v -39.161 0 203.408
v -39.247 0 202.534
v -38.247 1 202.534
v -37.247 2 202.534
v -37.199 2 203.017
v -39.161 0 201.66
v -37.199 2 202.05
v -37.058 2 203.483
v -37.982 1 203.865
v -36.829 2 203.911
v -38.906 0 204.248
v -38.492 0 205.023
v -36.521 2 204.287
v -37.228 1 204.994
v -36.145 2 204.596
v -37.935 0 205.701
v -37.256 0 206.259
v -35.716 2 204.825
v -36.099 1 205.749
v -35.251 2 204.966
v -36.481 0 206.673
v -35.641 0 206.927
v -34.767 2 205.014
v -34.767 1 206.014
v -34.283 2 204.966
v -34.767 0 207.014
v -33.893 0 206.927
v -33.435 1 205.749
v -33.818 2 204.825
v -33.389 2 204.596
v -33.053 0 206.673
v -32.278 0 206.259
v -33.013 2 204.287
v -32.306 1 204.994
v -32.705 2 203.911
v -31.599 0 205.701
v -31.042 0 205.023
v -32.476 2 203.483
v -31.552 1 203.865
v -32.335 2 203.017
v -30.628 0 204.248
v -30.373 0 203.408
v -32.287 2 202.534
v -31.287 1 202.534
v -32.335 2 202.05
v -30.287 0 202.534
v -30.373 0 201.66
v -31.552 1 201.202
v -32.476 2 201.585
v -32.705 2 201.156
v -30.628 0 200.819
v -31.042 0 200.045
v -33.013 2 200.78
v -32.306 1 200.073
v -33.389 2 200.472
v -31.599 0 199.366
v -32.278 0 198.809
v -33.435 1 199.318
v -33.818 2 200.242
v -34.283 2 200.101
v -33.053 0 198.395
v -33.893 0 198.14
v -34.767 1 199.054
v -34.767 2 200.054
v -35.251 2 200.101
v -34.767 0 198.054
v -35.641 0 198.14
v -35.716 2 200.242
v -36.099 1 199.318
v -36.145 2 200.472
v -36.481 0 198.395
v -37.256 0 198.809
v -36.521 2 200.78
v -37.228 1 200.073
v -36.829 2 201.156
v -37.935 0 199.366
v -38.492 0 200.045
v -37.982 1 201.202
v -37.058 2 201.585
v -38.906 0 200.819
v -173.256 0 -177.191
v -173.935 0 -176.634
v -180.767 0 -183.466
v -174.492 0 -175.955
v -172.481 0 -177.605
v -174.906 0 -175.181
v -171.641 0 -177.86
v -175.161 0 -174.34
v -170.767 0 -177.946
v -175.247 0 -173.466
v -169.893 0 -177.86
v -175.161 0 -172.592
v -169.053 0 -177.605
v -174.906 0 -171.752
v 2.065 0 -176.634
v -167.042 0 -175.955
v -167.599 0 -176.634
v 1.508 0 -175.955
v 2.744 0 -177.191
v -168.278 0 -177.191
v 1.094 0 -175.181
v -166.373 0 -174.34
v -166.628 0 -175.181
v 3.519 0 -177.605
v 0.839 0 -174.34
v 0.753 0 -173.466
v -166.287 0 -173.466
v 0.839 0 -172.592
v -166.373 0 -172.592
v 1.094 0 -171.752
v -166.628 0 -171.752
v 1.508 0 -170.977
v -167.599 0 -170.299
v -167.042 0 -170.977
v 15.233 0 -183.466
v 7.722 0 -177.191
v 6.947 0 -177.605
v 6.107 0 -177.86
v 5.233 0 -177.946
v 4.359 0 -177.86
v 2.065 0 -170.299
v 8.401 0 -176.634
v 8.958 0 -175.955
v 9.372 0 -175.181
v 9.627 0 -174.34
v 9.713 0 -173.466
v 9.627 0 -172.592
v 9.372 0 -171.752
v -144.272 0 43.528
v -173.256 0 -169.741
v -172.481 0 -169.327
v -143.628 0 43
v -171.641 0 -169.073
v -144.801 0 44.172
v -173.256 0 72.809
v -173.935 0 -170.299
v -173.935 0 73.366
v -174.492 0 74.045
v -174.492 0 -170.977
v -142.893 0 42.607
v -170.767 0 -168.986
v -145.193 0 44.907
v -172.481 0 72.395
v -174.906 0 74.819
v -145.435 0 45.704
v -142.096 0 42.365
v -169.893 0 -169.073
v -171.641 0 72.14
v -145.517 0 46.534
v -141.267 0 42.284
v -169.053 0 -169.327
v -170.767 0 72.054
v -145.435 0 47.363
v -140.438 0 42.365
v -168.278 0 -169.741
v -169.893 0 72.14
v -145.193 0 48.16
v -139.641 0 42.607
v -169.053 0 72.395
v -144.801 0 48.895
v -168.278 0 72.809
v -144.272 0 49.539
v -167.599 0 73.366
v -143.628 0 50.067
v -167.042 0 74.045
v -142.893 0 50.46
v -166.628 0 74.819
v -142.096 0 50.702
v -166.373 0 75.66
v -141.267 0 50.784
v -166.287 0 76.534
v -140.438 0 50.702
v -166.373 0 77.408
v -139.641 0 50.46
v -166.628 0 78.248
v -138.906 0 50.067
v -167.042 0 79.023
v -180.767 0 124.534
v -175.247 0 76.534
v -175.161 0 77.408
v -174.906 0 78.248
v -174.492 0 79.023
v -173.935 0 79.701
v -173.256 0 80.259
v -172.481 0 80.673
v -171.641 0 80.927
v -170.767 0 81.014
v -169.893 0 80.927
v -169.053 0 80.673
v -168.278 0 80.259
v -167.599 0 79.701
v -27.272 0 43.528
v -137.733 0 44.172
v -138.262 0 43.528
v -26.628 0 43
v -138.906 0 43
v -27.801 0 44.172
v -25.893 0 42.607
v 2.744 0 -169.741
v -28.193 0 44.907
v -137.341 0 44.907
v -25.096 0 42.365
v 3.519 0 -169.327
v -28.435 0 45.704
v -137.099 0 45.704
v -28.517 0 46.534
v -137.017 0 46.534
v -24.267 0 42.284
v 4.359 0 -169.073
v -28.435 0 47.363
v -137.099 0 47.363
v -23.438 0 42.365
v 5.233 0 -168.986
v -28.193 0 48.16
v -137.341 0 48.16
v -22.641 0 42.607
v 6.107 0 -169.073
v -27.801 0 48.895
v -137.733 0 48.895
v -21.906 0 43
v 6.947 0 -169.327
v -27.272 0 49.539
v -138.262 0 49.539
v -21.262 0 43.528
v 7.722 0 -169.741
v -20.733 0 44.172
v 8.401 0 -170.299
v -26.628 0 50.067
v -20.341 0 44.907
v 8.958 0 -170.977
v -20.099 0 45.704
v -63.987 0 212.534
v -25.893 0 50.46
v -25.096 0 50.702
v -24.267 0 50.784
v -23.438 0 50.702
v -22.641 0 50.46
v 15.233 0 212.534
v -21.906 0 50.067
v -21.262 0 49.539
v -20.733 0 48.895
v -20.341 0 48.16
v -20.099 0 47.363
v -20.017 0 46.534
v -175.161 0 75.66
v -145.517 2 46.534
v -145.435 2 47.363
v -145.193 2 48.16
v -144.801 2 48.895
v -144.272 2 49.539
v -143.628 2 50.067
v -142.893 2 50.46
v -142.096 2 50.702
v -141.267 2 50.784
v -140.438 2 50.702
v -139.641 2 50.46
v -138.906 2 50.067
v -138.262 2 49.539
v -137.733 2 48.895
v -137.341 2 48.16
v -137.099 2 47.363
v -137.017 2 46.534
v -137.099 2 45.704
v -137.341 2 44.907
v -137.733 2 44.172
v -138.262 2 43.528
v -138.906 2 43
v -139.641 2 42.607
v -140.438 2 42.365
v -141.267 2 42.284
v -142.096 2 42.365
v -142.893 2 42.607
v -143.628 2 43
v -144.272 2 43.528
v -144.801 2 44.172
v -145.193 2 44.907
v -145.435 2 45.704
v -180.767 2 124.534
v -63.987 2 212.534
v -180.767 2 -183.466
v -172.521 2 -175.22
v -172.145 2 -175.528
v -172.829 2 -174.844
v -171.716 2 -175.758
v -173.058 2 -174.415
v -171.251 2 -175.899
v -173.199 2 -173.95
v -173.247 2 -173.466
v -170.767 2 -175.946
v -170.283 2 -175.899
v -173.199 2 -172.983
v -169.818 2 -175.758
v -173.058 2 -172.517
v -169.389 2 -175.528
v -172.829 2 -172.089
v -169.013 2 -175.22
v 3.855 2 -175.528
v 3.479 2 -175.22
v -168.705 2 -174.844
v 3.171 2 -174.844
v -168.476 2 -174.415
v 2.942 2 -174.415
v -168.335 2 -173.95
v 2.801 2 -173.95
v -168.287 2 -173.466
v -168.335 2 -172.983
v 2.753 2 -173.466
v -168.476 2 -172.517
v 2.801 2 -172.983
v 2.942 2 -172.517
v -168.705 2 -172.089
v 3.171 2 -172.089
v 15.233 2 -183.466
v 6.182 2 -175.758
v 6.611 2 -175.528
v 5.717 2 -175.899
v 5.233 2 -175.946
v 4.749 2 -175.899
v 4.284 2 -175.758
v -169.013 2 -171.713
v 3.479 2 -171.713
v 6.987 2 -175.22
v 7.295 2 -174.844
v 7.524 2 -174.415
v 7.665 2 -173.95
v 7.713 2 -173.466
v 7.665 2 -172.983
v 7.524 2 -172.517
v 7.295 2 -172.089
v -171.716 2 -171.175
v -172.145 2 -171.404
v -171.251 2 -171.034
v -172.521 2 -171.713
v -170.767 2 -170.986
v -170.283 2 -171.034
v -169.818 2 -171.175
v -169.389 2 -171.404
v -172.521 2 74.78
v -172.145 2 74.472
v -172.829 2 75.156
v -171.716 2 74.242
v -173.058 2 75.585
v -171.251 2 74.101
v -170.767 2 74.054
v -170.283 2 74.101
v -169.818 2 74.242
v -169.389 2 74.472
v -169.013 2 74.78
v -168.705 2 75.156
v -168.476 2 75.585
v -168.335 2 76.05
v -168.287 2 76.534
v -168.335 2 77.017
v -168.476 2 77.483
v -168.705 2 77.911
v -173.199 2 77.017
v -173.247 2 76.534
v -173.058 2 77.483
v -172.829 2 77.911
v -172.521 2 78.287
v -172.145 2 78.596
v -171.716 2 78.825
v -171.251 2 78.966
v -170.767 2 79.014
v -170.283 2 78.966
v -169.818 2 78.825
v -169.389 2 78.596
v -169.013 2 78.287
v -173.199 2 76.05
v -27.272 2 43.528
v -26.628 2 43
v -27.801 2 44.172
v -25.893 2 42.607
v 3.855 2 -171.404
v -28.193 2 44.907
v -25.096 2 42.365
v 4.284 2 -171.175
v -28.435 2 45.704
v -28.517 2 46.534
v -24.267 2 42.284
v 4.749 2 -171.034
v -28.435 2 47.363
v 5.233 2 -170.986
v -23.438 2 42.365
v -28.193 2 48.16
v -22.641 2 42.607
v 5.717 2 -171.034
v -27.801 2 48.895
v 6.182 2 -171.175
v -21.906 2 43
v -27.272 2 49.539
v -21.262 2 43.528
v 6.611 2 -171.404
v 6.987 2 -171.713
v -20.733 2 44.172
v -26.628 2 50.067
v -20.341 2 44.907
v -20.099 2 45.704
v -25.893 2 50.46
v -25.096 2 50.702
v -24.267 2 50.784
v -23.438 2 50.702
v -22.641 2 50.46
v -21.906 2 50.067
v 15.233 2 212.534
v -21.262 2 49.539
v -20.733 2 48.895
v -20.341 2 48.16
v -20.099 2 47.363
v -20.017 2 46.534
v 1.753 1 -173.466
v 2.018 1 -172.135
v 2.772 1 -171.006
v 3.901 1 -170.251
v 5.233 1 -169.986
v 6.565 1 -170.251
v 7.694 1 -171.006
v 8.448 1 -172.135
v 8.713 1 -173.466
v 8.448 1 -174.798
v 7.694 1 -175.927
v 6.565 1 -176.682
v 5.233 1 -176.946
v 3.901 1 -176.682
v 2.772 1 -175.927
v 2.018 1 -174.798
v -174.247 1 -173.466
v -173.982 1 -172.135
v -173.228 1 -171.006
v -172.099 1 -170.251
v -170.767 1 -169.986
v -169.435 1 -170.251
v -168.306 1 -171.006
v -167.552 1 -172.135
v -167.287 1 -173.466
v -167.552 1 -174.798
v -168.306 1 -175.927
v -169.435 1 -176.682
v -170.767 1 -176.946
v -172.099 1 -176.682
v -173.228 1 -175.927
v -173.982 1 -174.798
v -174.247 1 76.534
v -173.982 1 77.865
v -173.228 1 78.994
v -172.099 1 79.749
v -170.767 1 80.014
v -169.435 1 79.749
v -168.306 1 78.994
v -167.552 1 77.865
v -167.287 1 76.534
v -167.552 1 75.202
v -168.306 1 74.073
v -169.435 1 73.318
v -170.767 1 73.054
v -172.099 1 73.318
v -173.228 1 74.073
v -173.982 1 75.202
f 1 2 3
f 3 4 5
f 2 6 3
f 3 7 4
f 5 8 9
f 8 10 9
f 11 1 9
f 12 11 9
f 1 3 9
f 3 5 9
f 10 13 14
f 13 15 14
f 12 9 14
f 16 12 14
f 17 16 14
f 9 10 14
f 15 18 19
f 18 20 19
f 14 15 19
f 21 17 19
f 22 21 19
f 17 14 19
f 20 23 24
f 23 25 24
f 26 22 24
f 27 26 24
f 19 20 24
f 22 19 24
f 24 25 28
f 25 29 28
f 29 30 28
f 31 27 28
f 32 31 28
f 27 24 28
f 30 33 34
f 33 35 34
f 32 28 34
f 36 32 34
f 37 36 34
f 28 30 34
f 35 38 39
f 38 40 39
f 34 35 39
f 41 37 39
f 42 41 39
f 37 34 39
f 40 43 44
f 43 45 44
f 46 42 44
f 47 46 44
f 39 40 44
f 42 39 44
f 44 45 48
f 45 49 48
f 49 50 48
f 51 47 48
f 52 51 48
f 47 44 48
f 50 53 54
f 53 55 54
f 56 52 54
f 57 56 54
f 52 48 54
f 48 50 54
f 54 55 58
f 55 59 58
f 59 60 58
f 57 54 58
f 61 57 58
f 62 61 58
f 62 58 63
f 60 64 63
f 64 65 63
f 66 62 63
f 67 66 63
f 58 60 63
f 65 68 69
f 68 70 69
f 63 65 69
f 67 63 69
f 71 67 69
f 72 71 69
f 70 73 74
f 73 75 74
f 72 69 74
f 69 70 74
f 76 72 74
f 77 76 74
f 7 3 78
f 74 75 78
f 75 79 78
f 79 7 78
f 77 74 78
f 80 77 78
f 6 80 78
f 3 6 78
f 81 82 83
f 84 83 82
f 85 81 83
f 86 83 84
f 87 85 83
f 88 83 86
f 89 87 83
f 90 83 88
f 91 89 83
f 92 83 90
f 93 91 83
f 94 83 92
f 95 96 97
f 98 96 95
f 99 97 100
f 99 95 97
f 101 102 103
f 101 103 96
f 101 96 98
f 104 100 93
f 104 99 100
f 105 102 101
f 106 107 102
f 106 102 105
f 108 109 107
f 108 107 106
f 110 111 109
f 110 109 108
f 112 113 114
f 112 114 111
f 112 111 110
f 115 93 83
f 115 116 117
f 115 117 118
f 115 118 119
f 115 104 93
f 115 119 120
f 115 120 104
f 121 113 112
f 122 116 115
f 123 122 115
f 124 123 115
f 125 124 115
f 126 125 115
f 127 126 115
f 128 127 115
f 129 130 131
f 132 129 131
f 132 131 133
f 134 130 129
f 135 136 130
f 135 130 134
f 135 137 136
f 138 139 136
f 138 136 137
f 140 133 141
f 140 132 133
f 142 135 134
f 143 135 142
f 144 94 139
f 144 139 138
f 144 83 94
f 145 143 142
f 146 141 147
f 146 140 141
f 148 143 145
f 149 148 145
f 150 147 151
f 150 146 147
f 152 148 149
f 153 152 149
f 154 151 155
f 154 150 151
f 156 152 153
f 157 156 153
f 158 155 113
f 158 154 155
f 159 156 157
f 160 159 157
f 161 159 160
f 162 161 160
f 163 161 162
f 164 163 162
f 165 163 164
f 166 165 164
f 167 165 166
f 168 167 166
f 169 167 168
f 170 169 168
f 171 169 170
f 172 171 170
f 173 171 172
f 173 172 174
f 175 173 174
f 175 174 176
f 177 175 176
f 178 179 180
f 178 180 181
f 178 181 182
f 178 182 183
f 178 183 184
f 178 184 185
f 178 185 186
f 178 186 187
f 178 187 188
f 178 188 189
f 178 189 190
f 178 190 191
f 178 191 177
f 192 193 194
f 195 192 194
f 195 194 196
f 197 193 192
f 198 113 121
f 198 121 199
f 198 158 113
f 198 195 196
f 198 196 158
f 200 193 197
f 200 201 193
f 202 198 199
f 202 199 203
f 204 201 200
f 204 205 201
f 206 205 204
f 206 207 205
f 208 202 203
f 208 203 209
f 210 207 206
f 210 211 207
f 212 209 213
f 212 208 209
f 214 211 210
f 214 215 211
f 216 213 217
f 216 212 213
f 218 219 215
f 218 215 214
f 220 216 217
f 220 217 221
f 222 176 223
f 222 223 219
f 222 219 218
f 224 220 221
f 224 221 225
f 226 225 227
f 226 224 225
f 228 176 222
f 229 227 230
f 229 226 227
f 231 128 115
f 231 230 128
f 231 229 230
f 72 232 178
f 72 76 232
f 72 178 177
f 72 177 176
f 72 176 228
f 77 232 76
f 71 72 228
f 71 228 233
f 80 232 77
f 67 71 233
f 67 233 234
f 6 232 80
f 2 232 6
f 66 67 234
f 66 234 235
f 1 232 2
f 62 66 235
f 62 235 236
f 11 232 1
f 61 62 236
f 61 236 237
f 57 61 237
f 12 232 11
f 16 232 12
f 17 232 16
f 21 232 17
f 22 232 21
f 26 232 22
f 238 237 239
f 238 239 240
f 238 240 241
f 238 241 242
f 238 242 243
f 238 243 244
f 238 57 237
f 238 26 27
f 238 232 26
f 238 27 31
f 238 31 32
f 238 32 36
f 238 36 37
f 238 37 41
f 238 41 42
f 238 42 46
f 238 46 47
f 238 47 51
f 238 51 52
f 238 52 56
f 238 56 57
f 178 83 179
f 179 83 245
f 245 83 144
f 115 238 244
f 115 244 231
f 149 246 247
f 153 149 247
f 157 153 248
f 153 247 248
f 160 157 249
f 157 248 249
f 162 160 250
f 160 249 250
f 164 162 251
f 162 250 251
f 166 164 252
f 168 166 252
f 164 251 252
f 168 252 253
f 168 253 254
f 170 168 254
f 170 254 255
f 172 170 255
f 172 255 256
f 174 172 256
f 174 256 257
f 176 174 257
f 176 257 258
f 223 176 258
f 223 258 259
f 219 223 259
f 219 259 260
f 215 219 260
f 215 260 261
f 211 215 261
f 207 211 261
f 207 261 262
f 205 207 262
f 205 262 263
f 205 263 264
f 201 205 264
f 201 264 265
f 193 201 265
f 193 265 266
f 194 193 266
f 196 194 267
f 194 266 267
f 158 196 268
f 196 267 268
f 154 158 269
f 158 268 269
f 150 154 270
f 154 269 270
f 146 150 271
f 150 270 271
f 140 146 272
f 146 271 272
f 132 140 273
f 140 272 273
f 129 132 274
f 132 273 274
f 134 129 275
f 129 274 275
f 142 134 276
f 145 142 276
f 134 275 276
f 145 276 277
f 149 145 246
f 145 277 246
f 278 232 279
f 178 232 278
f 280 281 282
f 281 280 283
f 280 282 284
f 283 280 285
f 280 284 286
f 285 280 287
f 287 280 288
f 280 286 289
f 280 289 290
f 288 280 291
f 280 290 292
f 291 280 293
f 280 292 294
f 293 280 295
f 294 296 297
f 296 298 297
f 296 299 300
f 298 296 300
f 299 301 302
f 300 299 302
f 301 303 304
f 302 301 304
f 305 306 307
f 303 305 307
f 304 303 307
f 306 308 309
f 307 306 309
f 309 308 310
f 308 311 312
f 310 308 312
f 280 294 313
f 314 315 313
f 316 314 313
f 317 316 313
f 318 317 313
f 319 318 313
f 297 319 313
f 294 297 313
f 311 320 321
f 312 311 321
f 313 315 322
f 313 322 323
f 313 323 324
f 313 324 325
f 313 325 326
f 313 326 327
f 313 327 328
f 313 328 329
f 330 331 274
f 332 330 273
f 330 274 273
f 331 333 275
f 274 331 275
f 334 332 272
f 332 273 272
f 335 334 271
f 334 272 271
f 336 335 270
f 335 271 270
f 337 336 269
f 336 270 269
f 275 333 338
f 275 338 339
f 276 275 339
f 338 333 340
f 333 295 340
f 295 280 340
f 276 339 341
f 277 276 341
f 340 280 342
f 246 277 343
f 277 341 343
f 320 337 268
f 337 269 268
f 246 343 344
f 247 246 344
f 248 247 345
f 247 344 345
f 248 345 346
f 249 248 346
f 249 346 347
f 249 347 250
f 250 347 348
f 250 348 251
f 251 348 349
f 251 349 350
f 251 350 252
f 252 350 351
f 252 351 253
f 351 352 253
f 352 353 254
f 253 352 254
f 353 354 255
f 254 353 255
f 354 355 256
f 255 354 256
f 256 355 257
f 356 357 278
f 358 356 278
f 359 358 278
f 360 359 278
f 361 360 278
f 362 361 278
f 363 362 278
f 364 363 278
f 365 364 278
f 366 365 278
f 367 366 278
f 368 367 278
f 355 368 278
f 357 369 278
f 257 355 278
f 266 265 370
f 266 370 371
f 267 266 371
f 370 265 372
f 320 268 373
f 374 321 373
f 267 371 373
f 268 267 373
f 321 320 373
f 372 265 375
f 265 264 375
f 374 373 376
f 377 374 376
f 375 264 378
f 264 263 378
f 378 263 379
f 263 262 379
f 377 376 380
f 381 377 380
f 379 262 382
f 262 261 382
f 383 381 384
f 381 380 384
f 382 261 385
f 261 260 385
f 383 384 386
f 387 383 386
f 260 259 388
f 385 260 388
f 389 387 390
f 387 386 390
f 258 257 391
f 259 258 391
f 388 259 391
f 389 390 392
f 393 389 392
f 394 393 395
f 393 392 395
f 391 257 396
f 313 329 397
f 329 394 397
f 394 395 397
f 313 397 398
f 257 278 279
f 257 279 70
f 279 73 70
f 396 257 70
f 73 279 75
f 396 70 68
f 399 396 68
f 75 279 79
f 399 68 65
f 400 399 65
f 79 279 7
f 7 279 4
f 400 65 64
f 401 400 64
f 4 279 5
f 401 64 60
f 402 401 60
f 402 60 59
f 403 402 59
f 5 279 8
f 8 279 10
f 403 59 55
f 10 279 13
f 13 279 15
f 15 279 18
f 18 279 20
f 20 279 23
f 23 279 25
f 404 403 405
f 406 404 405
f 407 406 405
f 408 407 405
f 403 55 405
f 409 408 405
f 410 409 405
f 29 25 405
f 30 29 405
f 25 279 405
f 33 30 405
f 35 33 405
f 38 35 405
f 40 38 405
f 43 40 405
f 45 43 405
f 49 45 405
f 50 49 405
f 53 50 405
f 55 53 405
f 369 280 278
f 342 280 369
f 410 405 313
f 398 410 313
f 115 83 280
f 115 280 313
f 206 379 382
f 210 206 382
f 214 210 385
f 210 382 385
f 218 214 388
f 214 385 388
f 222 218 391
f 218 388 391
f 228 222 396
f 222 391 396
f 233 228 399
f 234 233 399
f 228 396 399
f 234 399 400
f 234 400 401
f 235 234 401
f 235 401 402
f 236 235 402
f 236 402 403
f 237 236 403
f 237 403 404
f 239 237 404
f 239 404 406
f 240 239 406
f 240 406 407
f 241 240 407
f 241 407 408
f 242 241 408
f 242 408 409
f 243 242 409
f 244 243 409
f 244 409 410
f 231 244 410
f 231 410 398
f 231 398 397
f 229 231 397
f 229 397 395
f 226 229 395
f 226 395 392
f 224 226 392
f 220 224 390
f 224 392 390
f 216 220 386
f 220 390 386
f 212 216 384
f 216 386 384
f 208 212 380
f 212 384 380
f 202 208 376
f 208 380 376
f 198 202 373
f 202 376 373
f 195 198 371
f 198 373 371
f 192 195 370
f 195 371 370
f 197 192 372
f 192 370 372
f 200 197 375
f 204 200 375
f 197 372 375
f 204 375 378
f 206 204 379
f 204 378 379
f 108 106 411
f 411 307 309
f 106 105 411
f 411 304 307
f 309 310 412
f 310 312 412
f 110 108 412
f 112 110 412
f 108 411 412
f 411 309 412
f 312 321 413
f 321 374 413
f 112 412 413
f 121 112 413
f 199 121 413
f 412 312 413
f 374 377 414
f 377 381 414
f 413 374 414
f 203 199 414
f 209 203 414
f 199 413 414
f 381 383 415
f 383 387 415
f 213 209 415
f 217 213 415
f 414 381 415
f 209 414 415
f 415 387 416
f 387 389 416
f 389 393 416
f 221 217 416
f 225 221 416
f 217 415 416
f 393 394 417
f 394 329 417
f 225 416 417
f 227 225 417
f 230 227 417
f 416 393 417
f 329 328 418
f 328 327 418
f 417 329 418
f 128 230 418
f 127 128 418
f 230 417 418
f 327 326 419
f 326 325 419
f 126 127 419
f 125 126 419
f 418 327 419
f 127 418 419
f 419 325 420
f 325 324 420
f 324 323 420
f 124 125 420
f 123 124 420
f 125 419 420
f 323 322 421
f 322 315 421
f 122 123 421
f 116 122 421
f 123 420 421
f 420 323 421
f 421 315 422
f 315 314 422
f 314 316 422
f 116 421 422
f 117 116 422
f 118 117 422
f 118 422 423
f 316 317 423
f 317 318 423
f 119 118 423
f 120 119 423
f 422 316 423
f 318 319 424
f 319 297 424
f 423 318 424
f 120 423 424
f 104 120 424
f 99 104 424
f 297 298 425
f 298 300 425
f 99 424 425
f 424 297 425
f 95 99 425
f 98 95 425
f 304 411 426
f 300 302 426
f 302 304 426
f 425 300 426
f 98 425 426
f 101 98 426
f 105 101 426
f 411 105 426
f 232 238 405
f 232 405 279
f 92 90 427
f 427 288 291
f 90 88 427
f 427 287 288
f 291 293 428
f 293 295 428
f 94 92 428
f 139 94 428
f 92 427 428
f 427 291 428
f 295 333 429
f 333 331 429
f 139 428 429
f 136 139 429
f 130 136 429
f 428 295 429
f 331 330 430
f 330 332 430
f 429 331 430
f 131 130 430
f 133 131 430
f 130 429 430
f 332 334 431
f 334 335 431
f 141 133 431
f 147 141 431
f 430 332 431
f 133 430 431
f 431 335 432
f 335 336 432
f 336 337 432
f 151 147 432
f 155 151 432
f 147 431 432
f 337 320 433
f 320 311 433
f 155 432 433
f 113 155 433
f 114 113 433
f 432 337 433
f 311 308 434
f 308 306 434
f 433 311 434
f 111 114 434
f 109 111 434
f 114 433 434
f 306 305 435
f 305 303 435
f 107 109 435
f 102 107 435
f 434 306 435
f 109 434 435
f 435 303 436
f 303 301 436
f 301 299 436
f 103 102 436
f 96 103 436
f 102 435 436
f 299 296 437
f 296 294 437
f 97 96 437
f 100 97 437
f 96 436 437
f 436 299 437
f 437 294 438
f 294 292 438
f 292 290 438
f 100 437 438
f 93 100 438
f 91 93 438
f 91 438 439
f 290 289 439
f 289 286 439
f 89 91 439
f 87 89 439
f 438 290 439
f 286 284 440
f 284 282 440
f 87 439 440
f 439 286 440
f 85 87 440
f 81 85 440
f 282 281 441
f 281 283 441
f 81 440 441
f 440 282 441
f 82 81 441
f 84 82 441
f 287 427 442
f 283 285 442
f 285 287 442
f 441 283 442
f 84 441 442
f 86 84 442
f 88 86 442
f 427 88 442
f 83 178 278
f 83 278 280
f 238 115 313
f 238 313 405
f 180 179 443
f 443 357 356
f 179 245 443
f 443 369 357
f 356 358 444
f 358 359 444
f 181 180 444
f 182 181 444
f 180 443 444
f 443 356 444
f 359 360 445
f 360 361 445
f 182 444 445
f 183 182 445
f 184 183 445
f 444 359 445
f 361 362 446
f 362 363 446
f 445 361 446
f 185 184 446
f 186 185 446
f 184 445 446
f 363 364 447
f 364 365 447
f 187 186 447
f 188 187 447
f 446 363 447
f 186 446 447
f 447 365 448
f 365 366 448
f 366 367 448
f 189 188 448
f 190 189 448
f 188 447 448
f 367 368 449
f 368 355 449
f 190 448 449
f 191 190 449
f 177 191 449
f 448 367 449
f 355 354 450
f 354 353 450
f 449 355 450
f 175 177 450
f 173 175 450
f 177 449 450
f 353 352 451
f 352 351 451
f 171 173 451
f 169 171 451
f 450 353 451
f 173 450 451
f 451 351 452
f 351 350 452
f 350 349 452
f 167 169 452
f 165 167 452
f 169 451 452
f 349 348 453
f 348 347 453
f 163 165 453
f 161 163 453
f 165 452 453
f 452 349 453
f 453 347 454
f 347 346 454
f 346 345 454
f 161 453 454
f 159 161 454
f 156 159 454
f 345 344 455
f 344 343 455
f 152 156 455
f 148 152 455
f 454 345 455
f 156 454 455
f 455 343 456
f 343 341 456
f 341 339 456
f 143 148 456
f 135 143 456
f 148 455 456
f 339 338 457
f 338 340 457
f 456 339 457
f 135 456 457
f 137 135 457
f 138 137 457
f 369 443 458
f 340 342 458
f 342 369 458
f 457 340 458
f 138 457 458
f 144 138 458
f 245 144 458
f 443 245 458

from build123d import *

# Parameters (mm, degrees)
F1_DEPTH       = 2
F2_D           = 8.5
F2_DEPTH       = 15.75
F2_TIP         = 2.5536576309
F3_D           = 4.4
F3_CSINK_D     = 8.96
F3_CSINK_ANGLE = 90


with BuildPart() as f1:
    # F0 (on Front) → F1 (new body)
    with BuildSketch(Plane.XZ):
        Polygon((-180.7669961075, 124.533562243), (-180.7669961075, -183.466437757), (15.2330038925, -183.466437757), (15.2330038925, 212.533562243), (-63.9870518049, 212.533562243), align=None)
    extrude(amount=-F1_DEPTH)

    # F2
    with Locations(Plane.XZ):
        with Locations((-141.2669961075, 46.533562243), (-24.2669961075, 46.533562243)):
            Hole(F2_D / 2, depth=F2_DEPTH)
            with Locations((0, 0, -(F2_DEPTH + F2_TIP / 2))):  # 118° drill point
                Cone(0, F2_D / 2, F2_TIP, mode=Mode.SUBTRACT)

    # F3 (through all)
    with Locations(Plane.XZ):
        with Locations((-170.7669961075, 76.533562243), (-34.7669961075, 202.533562243), (5.2330038925, -173.466437757), (-170.7669961075, -173.466437757)):
            CounterSinkHole(F3_D / 2, F3_CSINK_D / 2, counter_sink_angle=F3_CSINK_ANGLE)


solid = f1.part
